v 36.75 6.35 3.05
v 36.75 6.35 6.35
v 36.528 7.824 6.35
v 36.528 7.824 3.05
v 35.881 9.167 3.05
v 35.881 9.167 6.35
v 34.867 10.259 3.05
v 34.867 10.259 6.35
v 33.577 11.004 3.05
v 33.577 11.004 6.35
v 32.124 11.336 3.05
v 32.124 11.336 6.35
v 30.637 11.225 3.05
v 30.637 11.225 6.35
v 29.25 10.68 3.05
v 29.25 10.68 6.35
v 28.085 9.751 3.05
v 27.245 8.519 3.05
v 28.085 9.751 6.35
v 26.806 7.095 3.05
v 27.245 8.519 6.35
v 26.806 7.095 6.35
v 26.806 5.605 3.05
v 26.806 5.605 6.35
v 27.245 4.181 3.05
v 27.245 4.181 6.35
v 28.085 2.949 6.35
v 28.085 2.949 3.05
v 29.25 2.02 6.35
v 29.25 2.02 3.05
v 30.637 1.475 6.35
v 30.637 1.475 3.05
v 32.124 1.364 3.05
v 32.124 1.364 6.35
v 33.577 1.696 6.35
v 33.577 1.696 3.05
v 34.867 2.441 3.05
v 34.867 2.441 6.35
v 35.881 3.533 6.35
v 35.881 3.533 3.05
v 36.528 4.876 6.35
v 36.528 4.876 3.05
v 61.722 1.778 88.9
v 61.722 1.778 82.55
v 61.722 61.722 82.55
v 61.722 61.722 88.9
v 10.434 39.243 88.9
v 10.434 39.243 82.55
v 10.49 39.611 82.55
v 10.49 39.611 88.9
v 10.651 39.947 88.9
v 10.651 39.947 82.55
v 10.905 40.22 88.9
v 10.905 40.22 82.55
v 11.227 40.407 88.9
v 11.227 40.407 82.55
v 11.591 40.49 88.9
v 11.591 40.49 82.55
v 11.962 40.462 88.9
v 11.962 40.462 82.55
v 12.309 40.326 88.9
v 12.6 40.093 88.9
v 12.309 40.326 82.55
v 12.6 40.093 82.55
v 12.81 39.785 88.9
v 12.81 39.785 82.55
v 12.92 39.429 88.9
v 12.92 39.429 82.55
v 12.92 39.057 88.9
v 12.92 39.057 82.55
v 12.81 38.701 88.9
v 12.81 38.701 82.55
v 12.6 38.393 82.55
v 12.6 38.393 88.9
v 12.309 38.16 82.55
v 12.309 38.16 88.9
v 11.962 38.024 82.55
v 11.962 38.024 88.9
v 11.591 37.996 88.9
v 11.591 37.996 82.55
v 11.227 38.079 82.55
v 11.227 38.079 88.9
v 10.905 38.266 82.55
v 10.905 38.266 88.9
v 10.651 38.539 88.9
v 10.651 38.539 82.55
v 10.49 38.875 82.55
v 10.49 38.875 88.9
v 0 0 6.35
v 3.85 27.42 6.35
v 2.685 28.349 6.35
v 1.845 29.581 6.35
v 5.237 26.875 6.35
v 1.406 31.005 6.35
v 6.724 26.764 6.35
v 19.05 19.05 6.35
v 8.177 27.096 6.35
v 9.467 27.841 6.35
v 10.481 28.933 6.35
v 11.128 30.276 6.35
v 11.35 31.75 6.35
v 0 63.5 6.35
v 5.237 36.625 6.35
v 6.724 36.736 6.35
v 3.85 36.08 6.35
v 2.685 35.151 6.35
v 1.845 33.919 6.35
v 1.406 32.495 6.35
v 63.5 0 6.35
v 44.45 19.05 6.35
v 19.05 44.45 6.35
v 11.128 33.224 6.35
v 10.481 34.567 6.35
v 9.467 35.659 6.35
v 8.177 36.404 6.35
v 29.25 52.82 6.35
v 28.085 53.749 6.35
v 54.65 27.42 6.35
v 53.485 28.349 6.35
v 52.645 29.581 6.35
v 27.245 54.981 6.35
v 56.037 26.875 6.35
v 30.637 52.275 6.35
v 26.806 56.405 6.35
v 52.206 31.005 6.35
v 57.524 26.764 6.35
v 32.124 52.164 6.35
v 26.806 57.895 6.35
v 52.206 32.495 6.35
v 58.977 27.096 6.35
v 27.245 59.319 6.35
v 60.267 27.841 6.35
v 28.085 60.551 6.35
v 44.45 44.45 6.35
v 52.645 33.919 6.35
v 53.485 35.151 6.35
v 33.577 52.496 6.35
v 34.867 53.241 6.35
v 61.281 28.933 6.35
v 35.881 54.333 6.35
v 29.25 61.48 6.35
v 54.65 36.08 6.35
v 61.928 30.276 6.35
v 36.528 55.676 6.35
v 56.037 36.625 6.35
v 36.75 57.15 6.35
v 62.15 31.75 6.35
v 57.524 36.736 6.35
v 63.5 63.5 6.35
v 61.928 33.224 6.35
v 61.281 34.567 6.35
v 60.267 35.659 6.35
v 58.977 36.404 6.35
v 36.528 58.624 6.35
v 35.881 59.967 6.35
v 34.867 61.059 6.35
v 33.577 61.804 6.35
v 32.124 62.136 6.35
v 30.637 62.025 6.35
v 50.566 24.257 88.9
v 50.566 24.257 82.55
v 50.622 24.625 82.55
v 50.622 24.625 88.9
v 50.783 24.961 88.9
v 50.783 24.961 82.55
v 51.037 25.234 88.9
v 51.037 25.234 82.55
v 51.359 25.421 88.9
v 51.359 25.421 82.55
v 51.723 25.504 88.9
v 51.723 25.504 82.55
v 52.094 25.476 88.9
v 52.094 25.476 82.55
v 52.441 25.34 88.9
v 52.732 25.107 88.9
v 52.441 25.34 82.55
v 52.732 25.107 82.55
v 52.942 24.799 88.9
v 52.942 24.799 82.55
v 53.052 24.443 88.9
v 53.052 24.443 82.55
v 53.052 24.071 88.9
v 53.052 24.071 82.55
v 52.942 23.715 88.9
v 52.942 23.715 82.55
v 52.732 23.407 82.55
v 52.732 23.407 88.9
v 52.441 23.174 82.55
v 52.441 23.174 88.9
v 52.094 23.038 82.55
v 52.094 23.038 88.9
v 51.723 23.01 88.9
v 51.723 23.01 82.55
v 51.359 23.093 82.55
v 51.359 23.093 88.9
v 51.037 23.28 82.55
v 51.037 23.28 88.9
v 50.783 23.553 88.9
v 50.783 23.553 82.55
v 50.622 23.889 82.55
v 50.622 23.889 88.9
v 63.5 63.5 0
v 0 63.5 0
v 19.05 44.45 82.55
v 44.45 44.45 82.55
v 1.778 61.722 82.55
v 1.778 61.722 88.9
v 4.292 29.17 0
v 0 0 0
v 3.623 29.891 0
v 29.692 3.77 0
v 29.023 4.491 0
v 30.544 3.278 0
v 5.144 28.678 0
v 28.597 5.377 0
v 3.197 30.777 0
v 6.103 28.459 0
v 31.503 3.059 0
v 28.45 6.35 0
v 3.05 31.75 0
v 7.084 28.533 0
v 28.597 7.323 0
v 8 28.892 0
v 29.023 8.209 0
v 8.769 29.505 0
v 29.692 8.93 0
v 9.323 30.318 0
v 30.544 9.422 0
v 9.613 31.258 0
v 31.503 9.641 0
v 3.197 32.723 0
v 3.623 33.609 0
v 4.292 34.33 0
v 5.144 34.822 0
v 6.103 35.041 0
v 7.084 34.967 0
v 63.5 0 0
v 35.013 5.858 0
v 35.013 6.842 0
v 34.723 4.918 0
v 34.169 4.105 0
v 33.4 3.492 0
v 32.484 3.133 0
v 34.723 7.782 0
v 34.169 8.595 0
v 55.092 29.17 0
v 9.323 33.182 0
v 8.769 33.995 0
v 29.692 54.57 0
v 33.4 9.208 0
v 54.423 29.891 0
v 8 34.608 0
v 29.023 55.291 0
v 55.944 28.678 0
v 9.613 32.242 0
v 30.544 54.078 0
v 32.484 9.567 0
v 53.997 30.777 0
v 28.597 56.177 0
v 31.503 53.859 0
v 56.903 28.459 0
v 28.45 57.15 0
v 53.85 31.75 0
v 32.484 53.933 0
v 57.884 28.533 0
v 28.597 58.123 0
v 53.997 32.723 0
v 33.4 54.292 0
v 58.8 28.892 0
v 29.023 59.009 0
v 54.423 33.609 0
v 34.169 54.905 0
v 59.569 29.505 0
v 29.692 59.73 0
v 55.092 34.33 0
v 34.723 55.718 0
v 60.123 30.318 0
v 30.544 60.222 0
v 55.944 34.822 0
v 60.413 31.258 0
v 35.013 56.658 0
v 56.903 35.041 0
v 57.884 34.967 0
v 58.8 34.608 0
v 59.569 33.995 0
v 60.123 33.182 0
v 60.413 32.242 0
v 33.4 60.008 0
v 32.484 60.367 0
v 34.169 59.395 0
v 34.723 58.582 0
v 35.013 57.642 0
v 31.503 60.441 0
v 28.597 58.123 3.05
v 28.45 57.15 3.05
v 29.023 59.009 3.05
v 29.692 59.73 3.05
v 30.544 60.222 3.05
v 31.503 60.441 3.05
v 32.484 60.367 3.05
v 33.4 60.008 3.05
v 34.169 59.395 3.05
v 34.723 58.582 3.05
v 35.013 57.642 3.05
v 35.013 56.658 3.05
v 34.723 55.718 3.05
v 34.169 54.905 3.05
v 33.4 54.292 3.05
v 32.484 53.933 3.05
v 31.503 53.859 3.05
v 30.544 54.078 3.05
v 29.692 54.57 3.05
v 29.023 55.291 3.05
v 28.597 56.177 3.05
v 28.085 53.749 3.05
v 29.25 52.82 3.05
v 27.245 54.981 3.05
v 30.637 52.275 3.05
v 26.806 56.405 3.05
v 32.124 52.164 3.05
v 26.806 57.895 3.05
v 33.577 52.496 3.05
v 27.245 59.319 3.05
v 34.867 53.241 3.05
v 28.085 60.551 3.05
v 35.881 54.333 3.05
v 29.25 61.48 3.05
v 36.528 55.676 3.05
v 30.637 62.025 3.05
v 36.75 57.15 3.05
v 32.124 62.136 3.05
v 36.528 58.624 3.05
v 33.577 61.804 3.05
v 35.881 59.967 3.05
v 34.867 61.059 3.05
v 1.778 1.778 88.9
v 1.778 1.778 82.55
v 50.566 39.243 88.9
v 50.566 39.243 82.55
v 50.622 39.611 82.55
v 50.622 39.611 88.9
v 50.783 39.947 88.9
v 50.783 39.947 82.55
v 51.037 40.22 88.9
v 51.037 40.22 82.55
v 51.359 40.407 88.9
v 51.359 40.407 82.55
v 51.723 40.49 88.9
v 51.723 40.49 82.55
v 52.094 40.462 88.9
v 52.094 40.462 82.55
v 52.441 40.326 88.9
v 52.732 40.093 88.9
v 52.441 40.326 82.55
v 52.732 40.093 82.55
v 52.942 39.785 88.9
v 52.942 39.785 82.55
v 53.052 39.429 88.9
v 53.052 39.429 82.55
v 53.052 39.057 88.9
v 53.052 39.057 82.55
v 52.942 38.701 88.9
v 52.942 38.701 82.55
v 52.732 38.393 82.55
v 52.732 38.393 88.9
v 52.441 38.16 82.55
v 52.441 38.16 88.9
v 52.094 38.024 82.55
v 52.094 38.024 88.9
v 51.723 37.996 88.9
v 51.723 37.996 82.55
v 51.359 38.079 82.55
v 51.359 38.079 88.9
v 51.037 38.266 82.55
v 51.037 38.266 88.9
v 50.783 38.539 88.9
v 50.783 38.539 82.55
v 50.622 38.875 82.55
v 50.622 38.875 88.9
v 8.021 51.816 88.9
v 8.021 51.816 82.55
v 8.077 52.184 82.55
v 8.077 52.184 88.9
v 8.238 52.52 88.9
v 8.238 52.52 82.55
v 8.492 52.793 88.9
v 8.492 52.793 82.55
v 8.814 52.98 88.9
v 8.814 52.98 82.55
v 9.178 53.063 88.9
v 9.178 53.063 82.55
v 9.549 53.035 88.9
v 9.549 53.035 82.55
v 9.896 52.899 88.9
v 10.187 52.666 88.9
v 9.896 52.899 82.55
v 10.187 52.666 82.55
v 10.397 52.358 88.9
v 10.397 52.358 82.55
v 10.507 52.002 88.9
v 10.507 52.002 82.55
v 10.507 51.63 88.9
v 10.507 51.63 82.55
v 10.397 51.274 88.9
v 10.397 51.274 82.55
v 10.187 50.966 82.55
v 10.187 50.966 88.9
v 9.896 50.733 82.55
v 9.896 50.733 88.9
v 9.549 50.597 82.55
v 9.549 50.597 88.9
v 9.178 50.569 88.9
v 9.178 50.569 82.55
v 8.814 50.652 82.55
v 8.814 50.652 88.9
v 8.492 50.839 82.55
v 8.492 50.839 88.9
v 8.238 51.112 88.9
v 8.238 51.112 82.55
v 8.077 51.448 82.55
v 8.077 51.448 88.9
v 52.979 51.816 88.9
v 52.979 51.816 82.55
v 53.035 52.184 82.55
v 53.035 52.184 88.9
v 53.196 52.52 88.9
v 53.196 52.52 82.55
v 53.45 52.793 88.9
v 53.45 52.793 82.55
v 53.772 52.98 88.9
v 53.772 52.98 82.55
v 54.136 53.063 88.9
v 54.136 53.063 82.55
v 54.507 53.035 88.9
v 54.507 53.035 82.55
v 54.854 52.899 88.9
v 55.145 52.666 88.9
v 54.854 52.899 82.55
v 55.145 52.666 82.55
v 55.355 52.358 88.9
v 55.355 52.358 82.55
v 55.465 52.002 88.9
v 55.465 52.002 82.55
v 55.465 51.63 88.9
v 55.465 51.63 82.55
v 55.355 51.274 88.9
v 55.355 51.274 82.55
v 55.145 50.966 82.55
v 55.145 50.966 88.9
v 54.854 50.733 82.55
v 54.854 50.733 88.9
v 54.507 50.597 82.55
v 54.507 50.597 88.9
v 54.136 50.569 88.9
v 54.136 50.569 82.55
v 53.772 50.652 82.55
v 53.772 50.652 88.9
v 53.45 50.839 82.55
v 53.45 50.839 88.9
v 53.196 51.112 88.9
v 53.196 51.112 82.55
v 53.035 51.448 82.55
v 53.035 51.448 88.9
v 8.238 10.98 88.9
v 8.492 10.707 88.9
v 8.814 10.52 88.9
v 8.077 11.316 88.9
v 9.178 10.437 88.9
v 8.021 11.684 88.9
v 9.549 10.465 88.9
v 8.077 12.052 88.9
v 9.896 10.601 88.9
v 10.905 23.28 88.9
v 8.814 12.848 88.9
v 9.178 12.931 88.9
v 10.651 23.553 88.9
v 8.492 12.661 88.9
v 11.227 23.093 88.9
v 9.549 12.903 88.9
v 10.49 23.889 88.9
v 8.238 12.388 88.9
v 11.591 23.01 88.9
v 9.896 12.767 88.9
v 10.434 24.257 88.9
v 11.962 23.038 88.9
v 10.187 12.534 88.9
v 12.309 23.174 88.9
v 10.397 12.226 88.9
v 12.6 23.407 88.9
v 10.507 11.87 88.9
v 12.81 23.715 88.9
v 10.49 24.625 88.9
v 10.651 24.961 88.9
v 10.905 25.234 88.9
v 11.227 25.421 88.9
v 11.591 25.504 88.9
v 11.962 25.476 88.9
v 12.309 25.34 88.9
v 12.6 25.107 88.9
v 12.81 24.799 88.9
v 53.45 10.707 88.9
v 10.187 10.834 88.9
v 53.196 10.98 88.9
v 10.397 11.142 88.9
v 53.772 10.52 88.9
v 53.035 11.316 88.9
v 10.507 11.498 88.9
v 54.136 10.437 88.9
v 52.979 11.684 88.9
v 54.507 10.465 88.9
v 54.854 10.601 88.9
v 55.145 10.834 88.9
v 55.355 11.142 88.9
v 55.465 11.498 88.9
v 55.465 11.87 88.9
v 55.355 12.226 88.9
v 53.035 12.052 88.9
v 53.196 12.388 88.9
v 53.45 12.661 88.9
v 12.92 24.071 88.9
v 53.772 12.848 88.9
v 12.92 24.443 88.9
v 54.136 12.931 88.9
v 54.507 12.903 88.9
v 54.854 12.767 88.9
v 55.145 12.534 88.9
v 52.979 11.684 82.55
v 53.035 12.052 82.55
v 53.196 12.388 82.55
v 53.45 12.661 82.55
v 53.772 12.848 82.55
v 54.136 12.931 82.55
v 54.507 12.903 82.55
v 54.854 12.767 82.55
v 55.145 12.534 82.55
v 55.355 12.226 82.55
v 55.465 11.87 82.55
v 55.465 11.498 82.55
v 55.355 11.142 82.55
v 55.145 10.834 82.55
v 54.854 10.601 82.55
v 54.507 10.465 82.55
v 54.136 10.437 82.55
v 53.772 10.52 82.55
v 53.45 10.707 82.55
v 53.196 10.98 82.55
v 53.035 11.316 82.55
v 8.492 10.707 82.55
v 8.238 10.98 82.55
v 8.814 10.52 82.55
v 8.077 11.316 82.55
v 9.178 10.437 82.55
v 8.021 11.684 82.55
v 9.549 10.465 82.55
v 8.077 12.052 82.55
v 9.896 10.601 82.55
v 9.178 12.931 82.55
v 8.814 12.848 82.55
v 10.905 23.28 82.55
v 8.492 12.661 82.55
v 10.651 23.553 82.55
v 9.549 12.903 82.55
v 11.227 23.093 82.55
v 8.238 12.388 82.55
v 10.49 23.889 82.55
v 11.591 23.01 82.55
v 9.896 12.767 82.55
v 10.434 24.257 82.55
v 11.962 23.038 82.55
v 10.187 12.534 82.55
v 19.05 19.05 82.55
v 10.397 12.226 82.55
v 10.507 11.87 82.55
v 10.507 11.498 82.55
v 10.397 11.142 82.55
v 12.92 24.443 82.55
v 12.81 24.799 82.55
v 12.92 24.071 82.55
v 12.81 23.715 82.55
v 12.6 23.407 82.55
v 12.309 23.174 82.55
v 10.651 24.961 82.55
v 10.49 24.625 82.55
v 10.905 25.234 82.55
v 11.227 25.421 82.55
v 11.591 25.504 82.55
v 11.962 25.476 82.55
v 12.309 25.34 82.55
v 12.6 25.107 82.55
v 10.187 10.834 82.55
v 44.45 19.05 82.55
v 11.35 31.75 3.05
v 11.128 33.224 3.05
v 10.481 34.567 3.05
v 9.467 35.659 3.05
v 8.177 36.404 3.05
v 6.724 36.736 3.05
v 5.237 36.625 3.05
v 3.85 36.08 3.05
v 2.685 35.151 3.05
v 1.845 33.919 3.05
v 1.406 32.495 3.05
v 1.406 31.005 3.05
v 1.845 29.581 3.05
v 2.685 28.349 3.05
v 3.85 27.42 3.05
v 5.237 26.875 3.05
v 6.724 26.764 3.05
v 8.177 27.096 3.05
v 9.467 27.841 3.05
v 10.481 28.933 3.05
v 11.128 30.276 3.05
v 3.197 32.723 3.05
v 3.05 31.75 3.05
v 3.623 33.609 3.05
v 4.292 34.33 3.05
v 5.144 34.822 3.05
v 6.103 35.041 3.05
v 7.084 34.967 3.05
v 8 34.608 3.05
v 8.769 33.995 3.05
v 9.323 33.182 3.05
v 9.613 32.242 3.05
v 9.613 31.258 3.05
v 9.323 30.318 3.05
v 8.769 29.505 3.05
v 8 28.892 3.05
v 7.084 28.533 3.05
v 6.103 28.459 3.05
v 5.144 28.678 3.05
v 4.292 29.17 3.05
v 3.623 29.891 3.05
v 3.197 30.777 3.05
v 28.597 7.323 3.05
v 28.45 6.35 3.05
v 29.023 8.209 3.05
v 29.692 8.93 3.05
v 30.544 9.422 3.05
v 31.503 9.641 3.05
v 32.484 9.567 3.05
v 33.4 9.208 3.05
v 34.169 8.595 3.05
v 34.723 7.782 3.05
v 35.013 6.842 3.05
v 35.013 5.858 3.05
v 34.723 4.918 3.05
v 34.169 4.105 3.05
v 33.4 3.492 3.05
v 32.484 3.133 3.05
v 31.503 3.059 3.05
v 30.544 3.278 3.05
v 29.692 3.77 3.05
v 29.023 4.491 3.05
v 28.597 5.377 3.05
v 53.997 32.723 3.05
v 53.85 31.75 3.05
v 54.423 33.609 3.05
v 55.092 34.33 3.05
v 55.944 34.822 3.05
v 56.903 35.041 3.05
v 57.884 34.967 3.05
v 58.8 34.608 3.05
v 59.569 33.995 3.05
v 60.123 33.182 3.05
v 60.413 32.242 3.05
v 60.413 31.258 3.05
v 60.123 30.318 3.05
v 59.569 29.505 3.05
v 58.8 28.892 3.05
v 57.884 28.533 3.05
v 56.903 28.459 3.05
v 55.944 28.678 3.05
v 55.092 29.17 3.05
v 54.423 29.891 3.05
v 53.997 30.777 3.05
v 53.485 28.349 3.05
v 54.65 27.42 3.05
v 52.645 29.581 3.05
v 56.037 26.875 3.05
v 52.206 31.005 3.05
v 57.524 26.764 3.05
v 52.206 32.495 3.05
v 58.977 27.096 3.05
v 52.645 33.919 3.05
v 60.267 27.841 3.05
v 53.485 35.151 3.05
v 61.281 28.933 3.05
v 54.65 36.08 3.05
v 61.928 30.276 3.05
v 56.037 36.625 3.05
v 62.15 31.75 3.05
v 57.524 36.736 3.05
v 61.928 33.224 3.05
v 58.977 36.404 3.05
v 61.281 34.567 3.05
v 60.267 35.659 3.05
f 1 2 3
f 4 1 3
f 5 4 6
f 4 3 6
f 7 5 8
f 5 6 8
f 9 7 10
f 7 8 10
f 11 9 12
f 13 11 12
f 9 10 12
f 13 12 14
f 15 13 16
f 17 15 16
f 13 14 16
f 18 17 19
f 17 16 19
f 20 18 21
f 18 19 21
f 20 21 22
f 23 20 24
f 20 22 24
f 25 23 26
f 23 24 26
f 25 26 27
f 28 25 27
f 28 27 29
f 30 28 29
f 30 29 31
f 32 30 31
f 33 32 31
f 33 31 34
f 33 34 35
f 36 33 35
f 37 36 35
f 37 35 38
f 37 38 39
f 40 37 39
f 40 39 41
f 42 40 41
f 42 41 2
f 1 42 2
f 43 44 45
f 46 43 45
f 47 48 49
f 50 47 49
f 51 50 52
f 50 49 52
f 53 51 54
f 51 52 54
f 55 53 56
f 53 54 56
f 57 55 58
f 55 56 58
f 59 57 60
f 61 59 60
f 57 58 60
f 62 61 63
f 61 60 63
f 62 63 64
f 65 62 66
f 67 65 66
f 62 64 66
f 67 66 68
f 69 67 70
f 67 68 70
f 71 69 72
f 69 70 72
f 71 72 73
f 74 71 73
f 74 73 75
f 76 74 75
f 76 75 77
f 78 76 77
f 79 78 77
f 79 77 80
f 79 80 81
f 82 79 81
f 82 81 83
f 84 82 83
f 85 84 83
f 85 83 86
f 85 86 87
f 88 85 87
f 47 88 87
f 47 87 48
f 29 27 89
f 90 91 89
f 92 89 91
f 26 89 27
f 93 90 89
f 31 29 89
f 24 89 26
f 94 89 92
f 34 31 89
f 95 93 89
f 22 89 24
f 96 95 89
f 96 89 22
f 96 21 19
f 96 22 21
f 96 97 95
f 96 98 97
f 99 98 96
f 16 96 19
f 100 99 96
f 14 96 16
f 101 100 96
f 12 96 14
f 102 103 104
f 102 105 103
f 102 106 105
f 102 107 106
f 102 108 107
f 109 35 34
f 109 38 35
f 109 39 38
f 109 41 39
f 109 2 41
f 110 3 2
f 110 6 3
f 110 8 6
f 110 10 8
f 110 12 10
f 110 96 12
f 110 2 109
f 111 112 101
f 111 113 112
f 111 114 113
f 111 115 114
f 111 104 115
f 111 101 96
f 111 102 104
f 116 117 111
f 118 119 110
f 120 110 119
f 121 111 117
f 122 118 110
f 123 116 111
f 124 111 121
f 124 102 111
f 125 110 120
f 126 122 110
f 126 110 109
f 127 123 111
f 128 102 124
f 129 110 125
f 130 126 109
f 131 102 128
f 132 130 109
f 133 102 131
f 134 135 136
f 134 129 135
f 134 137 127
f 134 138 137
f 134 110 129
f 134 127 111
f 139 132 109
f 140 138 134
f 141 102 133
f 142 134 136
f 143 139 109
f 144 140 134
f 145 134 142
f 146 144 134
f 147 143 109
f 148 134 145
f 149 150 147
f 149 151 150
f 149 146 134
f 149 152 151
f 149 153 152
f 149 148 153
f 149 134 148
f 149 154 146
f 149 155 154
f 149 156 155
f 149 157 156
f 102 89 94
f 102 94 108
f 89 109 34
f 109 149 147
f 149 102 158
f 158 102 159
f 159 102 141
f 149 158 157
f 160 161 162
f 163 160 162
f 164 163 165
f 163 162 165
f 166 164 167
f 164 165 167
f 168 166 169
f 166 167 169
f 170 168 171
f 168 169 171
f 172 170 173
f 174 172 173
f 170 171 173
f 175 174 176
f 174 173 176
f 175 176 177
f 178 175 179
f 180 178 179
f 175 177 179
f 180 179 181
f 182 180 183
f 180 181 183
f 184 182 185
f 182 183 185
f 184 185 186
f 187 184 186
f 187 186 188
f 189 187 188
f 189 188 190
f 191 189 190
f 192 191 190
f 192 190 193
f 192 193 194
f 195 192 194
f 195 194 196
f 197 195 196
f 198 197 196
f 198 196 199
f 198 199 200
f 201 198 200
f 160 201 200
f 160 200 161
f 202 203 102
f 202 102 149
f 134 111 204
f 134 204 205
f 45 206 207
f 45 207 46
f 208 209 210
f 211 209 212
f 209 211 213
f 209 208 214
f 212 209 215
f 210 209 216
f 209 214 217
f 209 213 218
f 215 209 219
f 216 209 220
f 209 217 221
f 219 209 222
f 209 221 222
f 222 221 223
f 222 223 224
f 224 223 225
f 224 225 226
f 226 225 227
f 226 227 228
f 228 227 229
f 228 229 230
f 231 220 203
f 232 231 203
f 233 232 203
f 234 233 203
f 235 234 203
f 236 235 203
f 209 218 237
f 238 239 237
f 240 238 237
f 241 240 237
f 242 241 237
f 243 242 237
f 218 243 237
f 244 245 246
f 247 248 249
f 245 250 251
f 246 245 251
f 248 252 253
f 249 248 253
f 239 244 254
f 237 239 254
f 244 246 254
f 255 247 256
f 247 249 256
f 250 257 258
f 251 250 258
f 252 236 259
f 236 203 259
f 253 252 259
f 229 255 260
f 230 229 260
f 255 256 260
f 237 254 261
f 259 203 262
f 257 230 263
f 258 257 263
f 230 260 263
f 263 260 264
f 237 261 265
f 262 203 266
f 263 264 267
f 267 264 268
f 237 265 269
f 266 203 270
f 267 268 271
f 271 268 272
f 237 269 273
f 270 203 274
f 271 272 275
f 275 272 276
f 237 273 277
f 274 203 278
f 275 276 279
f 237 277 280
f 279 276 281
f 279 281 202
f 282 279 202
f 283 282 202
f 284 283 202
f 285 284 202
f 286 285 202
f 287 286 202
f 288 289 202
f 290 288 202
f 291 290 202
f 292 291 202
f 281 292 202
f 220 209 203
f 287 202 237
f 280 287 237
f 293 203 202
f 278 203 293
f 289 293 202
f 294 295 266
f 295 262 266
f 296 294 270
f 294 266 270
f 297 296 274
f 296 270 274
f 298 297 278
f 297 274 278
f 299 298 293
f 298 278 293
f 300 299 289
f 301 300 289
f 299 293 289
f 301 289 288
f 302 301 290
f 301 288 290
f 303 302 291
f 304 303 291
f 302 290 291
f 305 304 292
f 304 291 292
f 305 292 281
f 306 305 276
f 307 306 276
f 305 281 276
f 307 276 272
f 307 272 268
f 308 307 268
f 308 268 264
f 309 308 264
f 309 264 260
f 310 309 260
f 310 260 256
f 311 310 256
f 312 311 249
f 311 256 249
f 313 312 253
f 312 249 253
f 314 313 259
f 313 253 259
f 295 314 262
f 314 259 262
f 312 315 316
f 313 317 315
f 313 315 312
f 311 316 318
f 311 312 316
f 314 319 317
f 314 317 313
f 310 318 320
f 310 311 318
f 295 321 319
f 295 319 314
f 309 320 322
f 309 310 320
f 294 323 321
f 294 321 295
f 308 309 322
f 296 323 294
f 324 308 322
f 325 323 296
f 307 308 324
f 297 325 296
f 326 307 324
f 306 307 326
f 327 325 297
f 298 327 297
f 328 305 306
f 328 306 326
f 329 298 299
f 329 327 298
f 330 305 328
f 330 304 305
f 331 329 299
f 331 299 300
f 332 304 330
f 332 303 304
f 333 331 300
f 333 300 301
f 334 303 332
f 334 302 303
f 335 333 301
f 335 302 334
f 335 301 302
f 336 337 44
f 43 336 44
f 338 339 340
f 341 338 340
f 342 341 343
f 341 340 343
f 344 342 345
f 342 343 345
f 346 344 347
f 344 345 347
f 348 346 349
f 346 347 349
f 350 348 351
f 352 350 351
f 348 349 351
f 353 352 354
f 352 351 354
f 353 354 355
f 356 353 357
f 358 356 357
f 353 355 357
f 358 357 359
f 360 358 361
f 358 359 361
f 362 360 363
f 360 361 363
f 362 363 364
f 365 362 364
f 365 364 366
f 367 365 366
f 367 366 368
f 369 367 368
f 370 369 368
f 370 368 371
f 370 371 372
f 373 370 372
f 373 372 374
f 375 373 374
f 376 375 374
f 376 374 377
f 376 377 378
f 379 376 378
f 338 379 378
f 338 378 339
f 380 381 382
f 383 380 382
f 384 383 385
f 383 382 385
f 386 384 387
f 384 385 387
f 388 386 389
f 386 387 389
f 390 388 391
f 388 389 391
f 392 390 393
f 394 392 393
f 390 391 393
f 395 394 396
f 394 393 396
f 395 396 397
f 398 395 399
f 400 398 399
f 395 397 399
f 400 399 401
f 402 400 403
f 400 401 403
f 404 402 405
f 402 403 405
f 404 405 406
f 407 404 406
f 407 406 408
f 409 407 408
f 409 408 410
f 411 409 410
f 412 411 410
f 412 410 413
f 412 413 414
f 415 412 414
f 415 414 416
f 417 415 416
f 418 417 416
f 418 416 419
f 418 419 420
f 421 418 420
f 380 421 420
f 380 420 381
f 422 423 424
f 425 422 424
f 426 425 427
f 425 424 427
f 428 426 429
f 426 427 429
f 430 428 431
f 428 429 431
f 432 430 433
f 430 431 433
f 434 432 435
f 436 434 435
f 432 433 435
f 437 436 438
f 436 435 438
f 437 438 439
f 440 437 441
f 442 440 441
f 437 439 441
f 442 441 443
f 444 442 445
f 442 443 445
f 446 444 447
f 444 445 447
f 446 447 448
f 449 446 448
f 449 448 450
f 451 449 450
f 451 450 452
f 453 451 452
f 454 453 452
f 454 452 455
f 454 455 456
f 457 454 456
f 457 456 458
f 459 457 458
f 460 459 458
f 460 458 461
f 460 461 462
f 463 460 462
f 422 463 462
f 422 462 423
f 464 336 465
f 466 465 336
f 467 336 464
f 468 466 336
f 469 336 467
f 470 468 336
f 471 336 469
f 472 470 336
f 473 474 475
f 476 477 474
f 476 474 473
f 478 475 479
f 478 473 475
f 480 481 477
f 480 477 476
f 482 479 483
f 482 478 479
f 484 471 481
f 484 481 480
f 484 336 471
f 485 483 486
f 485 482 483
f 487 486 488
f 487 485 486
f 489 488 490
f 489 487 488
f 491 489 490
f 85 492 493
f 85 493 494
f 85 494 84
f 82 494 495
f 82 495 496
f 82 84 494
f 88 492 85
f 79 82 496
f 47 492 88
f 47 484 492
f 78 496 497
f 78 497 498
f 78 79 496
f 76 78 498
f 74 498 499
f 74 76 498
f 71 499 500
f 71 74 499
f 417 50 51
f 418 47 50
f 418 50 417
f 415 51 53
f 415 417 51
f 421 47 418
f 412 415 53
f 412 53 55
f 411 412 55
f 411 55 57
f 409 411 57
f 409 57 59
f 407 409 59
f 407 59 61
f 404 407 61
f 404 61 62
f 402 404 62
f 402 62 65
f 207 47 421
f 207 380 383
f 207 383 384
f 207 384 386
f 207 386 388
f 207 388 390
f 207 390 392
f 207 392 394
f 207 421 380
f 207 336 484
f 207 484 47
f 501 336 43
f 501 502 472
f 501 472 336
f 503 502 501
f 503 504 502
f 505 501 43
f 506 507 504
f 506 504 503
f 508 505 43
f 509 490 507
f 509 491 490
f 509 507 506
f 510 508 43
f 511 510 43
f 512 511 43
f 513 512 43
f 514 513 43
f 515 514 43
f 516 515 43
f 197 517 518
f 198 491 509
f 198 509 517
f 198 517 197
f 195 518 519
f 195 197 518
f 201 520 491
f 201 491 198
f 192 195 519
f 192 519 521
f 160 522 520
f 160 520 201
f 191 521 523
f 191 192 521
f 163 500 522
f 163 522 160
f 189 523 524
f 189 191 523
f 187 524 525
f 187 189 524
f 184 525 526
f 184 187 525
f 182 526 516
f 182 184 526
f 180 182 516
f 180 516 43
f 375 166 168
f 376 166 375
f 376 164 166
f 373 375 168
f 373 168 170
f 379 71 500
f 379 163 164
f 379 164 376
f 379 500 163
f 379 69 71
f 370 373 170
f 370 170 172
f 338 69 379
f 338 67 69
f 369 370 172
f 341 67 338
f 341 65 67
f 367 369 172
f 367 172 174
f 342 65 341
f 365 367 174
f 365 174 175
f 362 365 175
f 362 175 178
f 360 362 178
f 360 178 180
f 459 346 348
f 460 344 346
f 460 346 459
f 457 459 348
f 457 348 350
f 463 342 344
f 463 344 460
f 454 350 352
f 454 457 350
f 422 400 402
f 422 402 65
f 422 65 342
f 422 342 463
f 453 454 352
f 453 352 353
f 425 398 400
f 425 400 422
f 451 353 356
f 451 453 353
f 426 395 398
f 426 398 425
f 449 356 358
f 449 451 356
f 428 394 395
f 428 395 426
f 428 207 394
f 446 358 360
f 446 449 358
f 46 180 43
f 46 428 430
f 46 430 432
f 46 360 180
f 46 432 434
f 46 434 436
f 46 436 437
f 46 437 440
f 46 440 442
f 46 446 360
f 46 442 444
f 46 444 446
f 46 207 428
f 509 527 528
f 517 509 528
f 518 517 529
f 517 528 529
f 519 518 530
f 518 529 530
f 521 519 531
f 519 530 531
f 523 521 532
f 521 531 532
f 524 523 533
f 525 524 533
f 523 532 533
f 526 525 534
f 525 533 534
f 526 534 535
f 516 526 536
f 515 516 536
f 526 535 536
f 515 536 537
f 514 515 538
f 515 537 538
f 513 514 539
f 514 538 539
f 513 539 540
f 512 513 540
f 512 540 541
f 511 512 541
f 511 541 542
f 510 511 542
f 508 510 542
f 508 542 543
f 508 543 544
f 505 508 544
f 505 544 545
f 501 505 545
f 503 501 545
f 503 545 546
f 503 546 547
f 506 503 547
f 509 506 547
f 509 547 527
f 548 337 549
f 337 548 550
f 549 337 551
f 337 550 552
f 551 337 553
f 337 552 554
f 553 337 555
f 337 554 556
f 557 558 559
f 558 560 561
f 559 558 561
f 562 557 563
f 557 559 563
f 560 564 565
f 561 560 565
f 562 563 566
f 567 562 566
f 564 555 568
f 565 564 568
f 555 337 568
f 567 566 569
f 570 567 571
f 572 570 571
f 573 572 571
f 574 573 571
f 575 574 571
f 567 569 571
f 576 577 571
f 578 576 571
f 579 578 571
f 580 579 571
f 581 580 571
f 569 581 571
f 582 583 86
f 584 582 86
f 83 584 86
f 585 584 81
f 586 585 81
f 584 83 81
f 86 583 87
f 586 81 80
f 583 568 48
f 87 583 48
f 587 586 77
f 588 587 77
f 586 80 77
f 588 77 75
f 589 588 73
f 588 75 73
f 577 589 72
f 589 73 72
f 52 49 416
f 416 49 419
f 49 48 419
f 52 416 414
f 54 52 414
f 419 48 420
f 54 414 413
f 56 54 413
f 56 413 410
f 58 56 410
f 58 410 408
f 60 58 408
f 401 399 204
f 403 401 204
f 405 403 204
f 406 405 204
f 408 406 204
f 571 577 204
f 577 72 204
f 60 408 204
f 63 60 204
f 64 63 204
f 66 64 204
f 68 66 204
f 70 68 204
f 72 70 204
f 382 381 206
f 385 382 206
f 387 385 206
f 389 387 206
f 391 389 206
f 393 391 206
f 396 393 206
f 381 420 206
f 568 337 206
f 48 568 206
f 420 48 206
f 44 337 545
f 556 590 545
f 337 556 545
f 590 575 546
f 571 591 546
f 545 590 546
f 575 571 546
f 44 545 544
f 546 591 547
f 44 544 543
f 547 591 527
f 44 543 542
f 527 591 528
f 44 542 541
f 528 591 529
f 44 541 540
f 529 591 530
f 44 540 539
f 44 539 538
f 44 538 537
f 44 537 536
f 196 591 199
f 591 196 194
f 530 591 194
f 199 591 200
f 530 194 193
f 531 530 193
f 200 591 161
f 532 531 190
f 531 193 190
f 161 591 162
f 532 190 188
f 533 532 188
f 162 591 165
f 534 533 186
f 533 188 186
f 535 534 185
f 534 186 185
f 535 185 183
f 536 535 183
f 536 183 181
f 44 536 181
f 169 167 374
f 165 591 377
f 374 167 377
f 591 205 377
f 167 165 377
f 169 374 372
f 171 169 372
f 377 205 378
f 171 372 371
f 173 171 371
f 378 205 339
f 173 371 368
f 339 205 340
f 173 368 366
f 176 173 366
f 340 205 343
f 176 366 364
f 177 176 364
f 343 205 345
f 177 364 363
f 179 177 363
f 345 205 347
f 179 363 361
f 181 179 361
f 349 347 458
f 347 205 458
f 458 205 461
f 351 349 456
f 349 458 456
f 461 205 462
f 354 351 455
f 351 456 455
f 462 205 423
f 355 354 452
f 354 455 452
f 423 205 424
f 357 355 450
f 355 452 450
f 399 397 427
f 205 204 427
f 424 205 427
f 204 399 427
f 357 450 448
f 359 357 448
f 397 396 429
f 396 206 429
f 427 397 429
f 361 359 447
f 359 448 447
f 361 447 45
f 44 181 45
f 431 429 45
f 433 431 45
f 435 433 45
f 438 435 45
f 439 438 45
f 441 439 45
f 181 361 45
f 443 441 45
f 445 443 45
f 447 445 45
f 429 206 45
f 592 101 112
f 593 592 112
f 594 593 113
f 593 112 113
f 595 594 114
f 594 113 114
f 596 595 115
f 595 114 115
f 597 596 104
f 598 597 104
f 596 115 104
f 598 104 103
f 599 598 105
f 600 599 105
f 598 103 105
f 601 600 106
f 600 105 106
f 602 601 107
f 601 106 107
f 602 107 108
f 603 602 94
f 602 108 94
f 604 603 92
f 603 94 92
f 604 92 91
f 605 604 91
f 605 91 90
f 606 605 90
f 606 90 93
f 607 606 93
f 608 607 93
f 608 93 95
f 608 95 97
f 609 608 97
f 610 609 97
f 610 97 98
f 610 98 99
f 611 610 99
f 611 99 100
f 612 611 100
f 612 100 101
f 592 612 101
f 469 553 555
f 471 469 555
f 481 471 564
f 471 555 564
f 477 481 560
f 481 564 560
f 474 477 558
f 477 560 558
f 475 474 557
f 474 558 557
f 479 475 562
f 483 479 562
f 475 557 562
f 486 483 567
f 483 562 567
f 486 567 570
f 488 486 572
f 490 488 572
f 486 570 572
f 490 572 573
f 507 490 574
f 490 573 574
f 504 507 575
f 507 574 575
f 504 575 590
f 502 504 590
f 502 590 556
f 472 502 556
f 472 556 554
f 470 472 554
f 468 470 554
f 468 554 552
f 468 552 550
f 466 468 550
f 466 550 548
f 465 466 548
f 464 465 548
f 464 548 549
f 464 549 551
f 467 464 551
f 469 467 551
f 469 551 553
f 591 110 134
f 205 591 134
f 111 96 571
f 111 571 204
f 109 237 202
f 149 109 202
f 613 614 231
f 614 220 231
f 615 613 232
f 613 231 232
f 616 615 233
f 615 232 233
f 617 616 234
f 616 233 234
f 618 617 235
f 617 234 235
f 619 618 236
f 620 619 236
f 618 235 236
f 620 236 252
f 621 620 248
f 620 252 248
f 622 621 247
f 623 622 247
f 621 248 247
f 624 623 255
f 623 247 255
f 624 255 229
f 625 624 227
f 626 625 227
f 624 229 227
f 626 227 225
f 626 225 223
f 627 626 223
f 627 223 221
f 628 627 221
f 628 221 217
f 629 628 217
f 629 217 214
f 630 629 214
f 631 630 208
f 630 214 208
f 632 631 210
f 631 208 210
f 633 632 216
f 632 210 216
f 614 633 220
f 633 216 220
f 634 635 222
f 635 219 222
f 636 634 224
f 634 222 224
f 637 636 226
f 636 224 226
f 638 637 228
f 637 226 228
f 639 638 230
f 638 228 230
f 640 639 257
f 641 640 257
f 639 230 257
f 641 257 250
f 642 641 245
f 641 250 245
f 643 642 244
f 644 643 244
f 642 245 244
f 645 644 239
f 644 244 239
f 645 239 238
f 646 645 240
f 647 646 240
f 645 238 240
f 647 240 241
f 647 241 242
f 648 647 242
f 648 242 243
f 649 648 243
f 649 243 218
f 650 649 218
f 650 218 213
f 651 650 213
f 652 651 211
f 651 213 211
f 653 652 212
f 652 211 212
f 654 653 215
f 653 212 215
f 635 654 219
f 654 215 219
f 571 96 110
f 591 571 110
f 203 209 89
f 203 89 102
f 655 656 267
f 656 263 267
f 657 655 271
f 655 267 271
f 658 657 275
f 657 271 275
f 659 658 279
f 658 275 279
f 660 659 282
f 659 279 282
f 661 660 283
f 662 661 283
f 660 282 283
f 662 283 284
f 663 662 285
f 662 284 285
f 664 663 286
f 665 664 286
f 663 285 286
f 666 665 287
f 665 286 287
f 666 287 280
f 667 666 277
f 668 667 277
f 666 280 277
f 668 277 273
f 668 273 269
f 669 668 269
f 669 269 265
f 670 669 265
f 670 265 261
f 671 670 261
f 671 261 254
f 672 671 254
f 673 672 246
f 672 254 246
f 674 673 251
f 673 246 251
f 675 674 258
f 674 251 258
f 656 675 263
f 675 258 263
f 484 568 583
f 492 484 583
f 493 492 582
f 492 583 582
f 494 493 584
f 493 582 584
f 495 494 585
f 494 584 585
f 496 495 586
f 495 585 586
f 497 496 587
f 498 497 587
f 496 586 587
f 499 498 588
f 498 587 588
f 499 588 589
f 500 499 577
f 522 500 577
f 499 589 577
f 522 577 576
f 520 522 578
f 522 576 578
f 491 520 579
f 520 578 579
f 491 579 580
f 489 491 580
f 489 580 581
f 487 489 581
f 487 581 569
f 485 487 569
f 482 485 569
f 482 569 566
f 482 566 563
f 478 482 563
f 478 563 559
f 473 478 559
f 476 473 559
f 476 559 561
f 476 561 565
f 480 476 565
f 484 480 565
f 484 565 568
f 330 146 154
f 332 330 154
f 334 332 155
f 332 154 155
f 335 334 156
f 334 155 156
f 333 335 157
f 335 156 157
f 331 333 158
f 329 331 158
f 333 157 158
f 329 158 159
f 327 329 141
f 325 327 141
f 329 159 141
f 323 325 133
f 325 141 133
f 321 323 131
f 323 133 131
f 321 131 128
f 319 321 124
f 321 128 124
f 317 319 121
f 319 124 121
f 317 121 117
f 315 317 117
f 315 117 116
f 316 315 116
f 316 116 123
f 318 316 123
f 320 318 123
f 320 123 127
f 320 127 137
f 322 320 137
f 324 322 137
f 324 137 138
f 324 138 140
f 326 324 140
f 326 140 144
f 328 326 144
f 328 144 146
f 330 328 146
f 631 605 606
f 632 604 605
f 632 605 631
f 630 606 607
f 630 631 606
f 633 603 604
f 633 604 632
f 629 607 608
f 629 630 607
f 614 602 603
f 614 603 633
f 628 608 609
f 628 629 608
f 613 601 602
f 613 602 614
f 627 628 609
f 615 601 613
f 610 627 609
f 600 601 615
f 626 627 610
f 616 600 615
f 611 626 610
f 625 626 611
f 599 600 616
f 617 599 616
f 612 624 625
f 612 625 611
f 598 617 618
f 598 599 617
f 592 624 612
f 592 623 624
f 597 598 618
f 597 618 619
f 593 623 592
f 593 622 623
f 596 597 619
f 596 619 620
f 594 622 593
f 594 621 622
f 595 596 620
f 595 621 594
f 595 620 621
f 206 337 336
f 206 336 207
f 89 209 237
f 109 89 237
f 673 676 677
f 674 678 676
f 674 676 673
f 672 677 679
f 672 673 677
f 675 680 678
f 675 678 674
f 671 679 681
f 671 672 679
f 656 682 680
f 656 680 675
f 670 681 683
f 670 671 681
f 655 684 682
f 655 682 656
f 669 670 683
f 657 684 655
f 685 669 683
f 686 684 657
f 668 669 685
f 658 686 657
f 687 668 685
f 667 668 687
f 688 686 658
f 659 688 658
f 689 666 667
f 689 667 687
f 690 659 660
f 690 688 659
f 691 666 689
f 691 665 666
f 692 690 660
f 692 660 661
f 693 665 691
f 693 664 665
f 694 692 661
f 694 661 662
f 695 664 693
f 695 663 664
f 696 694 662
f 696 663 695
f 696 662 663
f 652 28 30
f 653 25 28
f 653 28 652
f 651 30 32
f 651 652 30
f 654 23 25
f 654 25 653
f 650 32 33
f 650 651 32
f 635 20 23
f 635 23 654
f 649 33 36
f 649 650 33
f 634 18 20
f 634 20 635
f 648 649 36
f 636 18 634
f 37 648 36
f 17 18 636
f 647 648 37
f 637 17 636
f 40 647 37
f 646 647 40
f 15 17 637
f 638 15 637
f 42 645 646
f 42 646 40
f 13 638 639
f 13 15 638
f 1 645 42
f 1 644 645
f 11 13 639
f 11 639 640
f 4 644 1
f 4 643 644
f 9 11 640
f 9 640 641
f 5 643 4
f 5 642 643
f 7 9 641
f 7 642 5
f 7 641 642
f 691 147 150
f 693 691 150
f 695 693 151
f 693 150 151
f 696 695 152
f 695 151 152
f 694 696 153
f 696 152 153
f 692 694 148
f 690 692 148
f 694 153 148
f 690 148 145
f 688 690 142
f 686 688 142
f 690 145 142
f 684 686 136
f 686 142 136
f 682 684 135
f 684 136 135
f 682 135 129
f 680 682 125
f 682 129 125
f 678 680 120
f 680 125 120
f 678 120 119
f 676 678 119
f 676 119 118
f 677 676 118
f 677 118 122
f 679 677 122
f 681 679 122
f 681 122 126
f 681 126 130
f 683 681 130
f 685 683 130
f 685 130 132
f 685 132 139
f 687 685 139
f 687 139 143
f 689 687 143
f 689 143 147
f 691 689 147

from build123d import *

# Parameters (mm, degrees)
SKETCH2_W                       = 63.5
SKETCH2_H                       = 63.5
BOSS_EXTRUDE2_DEPTH             = 6.35
SKETCH3_W                       = 25.4
SKETCH3_H                       = 25.4
BOSS_EXTRUDE3_DEPTH             = 76.2
SKETCH14_W                      = 59.944
SKETCH14_H                      = 59.944
BOSS_EXTRUDE6_DEPTH             = 6.35
CBORE_FOR_M6_SBHCS2_D           = 6.6
CBORE_FOR_M6_SBHCS2_DEPTH       = 7.62
CBORE_FOR_M6_SBHCS2_CBORE_D     = 10
CBORE_FOR_M6_SBHCS2_CBORE_DEPTH = 3.3
CBORE_FOR_M6_SBHCS2_TIP         = 1.982840043
TAP_DRILL_FOR_M3X0_5_TAP2_D     = 2.5
TAP_DRILL_FOR_M3X0_5_TAP2_DEPTH = 7.62
TAP_DRILL_FOR_M3X0_5_TAP2_TIP   = 0.751075774


with BuildPart() as part:
    # Sketch2 → Boss-Extrude2 (new body)
    with BuildSketch(Plane.XY):
        with Locations((31.75, 31.75)):
            Rectangle(SKETCH2_W, SKETCH2_H)
    extrude(amount=BOSS_EXTRUDE2_DEPTH)

    # Sketch3 → Boss-Extrude3 (add)
    with BuildSketch(Plane.XY.offset(6.35)):
        with Locations((31.75, 31.75)):
            Rectangle(SKETCH3_W, SKETCH3_H)
    extrude(amount=BOSS_EXTRUDE3_DEPTH)

    # Sketch14 → Boss-Extrude6 (add)
    with BuildSketch(Plane.XY.offset(82.55)):
        with Locations((31.75, 31.75)):
            Rectangle(SKETCH14_W, SKETCH14_H)
    extrude(amount=BOSS_EXTRUDE6_DEPTH)

    # CBORE for M6 SBHCS2
    with Locations(Plane.XY.offset(6.35)):
        with Locations((57.15, 31.75), (31.75, 6.35), (31.75, 57.15), (6.35, 31.75)):
            CounterBoreHole(CBORE_FOR_M6_SBHCS2_D / 2, CBORE_FOR_M6_SBHCS2_CBORE_D / 2, CBORE_FOR_M6_SBHCS2_CBORE_DEPTH, depth=CBORE_FOR_M6_SBHCS2_DEPTH)
            with Locations((0, 0, -(CBORE_FOR_M6_SBHCS2_DEPTH + CBORE_FOR_M6_SBHCS2_TIP / 2))):  # 118° drill point
                Cone(0, CBORE_FOR_M6_SBHCS2_D / 2, CBORE_FOR_M6_SBHCS2_TIP, mode=Mode.SUBTRACT)

    # Tap Drill for M3x0.5 Tap2
    with Locations(Plane.XY.offset(88.9)):
        with Locations((9.271, 51.816), (9.271, 11.684), (54.229, 11.684), (54.229, 51.816), (11.684, 39.243), (11.684, 24.257), (51.816, 39.243), (51.816, 24.257)):
            Hole(TAP_DRILL_FOR_M3X0_5_TAP2_D / 2, depth=TAP_DRILL_FOR_M3X0_5_TAP2_DEPTH)
            with Locations((0, 0, -(TAP_DRILL_FOR_M3X0_5_TAP2_DEPTH + TAP_DRILL_FOR_M3X0_5_TAP2_TIP / 2))):  # 118° drill point
                Cone(0, TAP_DRILL_FOR_M3X0_5_TAP2_D / 2, TAP_DRILL_FOR_M3X0_5_TAP2_TIP, mode=Mode.SUBTRACT)


solid = part.part
